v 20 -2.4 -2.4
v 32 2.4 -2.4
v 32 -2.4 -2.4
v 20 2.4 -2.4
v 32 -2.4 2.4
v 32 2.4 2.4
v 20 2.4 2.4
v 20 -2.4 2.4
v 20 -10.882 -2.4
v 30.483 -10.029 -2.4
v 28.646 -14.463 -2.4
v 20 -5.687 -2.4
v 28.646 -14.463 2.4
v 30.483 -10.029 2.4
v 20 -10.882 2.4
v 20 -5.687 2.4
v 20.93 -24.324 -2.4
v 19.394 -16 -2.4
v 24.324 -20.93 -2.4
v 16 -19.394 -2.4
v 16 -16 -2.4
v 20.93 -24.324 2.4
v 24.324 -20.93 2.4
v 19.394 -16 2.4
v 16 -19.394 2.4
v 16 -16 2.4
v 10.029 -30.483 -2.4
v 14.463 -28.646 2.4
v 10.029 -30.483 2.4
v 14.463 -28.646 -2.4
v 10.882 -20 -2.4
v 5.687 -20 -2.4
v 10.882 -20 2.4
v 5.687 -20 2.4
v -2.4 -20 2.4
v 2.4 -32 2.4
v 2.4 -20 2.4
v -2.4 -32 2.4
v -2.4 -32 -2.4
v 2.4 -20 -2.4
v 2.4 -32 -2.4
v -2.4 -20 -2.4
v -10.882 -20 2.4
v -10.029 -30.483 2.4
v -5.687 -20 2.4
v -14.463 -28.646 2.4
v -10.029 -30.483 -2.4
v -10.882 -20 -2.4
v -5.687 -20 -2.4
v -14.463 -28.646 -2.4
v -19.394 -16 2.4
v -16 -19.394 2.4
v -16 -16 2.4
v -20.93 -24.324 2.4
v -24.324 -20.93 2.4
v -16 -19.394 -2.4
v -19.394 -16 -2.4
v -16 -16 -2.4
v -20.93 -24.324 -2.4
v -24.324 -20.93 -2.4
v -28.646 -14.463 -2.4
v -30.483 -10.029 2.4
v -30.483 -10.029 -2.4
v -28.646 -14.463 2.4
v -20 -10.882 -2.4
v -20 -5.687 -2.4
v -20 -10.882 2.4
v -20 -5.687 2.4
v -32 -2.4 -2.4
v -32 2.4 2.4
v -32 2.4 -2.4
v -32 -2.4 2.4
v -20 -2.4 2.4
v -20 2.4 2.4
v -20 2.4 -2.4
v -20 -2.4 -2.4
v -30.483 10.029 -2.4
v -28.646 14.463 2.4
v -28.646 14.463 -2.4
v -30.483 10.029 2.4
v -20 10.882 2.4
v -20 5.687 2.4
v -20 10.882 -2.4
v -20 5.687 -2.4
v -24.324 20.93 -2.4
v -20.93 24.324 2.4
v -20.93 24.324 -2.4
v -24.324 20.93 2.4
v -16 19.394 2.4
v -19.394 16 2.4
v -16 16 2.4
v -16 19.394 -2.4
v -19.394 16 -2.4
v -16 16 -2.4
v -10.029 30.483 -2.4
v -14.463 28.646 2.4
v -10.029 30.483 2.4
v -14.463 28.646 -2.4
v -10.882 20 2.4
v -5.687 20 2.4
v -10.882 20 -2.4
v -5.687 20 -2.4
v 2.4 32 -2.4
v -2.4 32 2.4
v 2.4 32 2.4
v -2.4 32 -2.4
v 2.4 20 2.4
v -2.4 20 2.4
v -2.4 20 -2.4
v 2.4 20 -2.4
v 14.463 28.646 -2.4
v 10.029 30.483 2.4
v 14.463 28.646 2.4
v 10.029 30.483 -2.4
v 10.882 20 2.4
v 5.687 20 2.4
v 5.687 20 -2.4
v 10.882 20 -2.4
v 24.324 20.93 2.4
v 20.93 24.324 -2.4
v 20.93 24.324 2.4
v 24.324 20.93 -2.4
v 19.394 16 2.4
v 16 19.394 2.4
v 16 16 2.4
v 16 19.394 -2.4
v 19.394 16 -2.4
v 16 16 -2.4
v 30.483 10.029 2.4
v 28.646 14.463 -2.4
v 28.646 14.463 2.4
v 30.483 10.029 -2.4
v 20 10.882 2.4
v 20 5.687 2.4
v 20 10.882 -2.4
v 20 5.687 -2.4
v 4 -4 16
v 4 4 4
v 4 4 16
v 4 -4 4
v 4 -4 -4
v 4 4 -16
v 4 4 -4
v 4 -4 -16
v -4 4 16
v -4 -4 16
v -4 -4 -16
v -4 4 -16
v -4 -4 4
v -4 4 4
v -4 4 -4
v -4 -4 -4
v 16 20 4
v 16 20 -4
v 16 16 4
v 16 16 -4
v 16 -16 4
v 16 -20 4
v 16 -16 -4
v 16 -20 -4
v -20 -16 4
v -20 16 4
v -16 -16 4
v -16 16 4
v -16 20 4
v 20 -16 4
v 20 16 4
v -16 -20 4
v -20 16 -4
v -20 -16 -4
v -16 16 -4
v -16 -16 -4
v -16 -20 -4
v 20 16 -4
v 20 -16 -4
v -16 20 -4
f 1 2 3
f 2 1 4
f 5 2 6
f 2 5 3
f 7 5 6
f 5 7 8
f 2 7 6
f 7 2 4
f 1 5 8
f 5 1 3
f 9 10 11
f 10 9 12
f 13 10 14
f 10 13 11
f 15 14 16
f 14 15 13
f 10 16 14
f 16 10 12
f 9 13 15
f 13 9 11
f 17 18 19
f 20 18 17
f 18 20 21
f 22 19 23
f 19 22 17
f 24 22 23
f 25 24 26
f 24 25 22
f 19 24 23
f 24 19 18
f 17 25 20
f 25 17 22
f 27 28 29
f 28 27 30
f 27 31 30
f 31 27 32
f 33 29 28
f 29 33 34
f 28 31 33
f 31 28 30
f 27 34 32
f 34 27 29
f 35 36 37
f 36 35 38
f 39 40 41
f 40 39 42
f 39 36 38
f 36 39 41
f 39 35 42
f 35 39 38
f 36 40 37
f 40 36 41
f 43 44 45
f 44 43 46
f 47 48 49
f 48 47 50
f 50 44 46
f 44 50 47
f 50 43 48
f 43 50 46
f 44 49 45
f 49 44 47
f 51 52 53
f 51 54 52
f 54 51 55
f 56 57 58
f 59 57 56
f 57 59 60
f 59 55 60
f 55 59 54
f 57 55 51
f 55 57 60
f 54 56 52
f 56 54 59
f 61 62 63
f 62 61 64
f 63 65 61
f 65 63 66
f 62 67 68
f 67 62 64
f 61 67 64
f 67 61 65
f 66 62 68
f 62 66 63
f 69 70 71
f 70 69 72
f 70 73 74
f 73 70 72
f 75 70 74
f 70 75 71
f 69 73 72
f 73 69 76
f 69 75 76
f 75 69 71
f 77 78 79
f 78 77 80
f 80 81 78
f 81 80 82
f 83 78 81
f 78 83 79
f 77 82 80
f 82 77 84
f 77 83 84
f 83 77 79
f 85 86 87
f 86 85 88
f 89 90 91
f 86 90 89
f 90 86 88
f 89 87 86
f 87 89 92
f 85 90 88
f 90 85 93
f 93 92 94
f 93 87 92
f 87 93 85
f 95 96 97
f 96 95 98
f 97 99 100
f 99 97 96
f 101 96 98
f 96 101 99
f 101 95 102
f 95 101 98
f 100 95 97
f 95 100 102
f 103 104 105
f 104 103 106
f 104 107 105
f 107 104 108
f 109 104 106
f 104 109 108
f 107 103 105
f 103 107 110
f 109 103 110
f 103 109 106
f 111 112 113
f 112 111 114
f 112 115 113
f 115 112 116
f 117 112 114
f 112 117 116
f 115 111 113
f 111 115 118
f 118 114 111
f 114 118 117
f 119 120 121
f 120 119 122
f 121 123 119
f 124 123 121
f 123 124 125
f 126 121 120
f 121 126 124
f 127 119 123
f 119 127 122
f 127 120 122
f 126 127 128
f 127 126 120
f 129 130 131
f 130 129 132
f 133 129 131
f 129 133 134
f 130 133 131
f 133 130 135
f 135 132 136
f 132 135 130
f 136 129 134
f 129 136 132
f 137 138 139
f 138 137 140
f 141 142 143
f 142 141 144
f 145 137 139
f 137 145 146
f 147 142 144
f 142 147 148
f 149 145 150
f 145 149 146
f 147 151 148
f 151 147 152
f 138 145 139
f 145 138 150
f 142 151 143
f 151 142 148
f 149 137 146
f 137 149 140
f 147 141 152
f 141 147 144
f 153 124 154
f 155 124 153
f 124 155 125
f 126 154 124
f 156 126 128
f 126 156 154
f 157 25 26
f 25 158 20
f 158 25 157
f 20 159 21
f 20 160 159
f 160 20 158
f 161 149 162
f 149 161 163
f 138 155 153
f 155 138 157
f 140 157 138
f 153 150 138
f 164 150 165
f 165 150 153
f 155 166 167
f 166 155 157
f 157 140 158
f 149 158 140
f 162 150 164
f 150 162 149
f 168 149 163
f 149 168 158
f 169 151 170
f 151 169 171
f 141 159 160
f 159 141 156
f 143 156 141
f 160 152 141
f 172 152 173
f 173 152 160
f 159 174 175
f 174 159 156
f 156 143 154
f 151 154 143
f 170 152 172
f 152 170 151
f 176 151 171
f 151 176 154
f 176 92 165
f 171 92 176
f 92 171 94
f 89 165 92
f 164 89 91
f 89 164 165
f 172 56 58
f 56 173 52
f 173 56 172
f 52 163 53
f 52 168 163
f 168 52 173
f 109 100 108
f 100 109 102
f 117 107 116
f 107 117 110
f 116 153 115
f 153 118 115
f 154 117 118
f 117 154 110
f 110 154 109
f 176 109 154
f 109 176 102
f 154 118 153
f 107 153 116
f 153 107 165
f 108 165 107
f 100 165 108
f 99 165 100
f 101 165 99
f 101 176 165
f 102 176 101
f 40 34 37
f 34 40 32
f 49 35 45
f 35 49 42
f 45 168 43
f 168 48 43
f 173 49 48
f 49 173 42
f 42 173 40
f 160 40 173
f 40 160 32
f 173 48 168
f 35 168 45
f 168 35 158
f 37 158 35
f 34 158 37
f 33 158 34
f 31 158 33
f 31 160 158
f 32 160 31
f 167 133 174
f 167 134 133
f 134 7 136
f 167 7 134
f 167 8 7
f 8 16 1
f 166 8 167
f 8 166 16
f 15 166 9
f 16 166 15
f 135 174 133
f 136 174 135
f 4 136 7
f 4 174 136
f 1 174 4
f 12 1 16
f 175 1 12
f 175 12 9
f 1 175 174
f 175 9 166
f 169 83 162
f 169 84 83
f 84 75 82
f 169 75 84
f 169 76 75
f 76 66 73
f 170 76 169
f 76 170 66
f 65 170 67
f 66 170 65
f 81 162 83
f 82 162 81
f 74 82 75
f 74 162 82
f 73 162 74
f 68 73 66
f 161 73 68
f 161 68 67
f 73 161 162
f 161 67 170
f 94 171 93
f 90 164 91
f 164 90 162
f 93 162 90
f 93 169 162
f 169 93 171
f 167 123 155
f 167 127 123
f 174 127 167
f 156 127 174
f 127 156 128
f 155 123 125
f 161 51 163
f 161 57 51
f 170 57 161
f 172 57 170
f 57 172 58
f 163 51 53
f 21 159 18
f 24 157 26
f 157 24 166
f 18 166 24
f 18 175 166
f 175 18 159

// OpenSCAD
size = 32;//block=32 //item=8


cube([size * 0.25, size * 0.25, size * 1], center = true);

cube([size * 1, size * 1.25, size * 0.25], center = true);
cube([size * 1.25, size * 1, size * 0.25], center = true);

end = 16;
for(curr = [0:1:end]) {
  rotate([0, 90, 0]) {
    rotate([360 / end * curr, 0, 0]) {
      translate([0, 0, size * 0.75]) {
        cube([size * 0.15, size * 0.15, size * 0.5], center = true);
      }
      ;//translate
    }
    ;//rotate
  }
  ;//rotate

}
;//for
